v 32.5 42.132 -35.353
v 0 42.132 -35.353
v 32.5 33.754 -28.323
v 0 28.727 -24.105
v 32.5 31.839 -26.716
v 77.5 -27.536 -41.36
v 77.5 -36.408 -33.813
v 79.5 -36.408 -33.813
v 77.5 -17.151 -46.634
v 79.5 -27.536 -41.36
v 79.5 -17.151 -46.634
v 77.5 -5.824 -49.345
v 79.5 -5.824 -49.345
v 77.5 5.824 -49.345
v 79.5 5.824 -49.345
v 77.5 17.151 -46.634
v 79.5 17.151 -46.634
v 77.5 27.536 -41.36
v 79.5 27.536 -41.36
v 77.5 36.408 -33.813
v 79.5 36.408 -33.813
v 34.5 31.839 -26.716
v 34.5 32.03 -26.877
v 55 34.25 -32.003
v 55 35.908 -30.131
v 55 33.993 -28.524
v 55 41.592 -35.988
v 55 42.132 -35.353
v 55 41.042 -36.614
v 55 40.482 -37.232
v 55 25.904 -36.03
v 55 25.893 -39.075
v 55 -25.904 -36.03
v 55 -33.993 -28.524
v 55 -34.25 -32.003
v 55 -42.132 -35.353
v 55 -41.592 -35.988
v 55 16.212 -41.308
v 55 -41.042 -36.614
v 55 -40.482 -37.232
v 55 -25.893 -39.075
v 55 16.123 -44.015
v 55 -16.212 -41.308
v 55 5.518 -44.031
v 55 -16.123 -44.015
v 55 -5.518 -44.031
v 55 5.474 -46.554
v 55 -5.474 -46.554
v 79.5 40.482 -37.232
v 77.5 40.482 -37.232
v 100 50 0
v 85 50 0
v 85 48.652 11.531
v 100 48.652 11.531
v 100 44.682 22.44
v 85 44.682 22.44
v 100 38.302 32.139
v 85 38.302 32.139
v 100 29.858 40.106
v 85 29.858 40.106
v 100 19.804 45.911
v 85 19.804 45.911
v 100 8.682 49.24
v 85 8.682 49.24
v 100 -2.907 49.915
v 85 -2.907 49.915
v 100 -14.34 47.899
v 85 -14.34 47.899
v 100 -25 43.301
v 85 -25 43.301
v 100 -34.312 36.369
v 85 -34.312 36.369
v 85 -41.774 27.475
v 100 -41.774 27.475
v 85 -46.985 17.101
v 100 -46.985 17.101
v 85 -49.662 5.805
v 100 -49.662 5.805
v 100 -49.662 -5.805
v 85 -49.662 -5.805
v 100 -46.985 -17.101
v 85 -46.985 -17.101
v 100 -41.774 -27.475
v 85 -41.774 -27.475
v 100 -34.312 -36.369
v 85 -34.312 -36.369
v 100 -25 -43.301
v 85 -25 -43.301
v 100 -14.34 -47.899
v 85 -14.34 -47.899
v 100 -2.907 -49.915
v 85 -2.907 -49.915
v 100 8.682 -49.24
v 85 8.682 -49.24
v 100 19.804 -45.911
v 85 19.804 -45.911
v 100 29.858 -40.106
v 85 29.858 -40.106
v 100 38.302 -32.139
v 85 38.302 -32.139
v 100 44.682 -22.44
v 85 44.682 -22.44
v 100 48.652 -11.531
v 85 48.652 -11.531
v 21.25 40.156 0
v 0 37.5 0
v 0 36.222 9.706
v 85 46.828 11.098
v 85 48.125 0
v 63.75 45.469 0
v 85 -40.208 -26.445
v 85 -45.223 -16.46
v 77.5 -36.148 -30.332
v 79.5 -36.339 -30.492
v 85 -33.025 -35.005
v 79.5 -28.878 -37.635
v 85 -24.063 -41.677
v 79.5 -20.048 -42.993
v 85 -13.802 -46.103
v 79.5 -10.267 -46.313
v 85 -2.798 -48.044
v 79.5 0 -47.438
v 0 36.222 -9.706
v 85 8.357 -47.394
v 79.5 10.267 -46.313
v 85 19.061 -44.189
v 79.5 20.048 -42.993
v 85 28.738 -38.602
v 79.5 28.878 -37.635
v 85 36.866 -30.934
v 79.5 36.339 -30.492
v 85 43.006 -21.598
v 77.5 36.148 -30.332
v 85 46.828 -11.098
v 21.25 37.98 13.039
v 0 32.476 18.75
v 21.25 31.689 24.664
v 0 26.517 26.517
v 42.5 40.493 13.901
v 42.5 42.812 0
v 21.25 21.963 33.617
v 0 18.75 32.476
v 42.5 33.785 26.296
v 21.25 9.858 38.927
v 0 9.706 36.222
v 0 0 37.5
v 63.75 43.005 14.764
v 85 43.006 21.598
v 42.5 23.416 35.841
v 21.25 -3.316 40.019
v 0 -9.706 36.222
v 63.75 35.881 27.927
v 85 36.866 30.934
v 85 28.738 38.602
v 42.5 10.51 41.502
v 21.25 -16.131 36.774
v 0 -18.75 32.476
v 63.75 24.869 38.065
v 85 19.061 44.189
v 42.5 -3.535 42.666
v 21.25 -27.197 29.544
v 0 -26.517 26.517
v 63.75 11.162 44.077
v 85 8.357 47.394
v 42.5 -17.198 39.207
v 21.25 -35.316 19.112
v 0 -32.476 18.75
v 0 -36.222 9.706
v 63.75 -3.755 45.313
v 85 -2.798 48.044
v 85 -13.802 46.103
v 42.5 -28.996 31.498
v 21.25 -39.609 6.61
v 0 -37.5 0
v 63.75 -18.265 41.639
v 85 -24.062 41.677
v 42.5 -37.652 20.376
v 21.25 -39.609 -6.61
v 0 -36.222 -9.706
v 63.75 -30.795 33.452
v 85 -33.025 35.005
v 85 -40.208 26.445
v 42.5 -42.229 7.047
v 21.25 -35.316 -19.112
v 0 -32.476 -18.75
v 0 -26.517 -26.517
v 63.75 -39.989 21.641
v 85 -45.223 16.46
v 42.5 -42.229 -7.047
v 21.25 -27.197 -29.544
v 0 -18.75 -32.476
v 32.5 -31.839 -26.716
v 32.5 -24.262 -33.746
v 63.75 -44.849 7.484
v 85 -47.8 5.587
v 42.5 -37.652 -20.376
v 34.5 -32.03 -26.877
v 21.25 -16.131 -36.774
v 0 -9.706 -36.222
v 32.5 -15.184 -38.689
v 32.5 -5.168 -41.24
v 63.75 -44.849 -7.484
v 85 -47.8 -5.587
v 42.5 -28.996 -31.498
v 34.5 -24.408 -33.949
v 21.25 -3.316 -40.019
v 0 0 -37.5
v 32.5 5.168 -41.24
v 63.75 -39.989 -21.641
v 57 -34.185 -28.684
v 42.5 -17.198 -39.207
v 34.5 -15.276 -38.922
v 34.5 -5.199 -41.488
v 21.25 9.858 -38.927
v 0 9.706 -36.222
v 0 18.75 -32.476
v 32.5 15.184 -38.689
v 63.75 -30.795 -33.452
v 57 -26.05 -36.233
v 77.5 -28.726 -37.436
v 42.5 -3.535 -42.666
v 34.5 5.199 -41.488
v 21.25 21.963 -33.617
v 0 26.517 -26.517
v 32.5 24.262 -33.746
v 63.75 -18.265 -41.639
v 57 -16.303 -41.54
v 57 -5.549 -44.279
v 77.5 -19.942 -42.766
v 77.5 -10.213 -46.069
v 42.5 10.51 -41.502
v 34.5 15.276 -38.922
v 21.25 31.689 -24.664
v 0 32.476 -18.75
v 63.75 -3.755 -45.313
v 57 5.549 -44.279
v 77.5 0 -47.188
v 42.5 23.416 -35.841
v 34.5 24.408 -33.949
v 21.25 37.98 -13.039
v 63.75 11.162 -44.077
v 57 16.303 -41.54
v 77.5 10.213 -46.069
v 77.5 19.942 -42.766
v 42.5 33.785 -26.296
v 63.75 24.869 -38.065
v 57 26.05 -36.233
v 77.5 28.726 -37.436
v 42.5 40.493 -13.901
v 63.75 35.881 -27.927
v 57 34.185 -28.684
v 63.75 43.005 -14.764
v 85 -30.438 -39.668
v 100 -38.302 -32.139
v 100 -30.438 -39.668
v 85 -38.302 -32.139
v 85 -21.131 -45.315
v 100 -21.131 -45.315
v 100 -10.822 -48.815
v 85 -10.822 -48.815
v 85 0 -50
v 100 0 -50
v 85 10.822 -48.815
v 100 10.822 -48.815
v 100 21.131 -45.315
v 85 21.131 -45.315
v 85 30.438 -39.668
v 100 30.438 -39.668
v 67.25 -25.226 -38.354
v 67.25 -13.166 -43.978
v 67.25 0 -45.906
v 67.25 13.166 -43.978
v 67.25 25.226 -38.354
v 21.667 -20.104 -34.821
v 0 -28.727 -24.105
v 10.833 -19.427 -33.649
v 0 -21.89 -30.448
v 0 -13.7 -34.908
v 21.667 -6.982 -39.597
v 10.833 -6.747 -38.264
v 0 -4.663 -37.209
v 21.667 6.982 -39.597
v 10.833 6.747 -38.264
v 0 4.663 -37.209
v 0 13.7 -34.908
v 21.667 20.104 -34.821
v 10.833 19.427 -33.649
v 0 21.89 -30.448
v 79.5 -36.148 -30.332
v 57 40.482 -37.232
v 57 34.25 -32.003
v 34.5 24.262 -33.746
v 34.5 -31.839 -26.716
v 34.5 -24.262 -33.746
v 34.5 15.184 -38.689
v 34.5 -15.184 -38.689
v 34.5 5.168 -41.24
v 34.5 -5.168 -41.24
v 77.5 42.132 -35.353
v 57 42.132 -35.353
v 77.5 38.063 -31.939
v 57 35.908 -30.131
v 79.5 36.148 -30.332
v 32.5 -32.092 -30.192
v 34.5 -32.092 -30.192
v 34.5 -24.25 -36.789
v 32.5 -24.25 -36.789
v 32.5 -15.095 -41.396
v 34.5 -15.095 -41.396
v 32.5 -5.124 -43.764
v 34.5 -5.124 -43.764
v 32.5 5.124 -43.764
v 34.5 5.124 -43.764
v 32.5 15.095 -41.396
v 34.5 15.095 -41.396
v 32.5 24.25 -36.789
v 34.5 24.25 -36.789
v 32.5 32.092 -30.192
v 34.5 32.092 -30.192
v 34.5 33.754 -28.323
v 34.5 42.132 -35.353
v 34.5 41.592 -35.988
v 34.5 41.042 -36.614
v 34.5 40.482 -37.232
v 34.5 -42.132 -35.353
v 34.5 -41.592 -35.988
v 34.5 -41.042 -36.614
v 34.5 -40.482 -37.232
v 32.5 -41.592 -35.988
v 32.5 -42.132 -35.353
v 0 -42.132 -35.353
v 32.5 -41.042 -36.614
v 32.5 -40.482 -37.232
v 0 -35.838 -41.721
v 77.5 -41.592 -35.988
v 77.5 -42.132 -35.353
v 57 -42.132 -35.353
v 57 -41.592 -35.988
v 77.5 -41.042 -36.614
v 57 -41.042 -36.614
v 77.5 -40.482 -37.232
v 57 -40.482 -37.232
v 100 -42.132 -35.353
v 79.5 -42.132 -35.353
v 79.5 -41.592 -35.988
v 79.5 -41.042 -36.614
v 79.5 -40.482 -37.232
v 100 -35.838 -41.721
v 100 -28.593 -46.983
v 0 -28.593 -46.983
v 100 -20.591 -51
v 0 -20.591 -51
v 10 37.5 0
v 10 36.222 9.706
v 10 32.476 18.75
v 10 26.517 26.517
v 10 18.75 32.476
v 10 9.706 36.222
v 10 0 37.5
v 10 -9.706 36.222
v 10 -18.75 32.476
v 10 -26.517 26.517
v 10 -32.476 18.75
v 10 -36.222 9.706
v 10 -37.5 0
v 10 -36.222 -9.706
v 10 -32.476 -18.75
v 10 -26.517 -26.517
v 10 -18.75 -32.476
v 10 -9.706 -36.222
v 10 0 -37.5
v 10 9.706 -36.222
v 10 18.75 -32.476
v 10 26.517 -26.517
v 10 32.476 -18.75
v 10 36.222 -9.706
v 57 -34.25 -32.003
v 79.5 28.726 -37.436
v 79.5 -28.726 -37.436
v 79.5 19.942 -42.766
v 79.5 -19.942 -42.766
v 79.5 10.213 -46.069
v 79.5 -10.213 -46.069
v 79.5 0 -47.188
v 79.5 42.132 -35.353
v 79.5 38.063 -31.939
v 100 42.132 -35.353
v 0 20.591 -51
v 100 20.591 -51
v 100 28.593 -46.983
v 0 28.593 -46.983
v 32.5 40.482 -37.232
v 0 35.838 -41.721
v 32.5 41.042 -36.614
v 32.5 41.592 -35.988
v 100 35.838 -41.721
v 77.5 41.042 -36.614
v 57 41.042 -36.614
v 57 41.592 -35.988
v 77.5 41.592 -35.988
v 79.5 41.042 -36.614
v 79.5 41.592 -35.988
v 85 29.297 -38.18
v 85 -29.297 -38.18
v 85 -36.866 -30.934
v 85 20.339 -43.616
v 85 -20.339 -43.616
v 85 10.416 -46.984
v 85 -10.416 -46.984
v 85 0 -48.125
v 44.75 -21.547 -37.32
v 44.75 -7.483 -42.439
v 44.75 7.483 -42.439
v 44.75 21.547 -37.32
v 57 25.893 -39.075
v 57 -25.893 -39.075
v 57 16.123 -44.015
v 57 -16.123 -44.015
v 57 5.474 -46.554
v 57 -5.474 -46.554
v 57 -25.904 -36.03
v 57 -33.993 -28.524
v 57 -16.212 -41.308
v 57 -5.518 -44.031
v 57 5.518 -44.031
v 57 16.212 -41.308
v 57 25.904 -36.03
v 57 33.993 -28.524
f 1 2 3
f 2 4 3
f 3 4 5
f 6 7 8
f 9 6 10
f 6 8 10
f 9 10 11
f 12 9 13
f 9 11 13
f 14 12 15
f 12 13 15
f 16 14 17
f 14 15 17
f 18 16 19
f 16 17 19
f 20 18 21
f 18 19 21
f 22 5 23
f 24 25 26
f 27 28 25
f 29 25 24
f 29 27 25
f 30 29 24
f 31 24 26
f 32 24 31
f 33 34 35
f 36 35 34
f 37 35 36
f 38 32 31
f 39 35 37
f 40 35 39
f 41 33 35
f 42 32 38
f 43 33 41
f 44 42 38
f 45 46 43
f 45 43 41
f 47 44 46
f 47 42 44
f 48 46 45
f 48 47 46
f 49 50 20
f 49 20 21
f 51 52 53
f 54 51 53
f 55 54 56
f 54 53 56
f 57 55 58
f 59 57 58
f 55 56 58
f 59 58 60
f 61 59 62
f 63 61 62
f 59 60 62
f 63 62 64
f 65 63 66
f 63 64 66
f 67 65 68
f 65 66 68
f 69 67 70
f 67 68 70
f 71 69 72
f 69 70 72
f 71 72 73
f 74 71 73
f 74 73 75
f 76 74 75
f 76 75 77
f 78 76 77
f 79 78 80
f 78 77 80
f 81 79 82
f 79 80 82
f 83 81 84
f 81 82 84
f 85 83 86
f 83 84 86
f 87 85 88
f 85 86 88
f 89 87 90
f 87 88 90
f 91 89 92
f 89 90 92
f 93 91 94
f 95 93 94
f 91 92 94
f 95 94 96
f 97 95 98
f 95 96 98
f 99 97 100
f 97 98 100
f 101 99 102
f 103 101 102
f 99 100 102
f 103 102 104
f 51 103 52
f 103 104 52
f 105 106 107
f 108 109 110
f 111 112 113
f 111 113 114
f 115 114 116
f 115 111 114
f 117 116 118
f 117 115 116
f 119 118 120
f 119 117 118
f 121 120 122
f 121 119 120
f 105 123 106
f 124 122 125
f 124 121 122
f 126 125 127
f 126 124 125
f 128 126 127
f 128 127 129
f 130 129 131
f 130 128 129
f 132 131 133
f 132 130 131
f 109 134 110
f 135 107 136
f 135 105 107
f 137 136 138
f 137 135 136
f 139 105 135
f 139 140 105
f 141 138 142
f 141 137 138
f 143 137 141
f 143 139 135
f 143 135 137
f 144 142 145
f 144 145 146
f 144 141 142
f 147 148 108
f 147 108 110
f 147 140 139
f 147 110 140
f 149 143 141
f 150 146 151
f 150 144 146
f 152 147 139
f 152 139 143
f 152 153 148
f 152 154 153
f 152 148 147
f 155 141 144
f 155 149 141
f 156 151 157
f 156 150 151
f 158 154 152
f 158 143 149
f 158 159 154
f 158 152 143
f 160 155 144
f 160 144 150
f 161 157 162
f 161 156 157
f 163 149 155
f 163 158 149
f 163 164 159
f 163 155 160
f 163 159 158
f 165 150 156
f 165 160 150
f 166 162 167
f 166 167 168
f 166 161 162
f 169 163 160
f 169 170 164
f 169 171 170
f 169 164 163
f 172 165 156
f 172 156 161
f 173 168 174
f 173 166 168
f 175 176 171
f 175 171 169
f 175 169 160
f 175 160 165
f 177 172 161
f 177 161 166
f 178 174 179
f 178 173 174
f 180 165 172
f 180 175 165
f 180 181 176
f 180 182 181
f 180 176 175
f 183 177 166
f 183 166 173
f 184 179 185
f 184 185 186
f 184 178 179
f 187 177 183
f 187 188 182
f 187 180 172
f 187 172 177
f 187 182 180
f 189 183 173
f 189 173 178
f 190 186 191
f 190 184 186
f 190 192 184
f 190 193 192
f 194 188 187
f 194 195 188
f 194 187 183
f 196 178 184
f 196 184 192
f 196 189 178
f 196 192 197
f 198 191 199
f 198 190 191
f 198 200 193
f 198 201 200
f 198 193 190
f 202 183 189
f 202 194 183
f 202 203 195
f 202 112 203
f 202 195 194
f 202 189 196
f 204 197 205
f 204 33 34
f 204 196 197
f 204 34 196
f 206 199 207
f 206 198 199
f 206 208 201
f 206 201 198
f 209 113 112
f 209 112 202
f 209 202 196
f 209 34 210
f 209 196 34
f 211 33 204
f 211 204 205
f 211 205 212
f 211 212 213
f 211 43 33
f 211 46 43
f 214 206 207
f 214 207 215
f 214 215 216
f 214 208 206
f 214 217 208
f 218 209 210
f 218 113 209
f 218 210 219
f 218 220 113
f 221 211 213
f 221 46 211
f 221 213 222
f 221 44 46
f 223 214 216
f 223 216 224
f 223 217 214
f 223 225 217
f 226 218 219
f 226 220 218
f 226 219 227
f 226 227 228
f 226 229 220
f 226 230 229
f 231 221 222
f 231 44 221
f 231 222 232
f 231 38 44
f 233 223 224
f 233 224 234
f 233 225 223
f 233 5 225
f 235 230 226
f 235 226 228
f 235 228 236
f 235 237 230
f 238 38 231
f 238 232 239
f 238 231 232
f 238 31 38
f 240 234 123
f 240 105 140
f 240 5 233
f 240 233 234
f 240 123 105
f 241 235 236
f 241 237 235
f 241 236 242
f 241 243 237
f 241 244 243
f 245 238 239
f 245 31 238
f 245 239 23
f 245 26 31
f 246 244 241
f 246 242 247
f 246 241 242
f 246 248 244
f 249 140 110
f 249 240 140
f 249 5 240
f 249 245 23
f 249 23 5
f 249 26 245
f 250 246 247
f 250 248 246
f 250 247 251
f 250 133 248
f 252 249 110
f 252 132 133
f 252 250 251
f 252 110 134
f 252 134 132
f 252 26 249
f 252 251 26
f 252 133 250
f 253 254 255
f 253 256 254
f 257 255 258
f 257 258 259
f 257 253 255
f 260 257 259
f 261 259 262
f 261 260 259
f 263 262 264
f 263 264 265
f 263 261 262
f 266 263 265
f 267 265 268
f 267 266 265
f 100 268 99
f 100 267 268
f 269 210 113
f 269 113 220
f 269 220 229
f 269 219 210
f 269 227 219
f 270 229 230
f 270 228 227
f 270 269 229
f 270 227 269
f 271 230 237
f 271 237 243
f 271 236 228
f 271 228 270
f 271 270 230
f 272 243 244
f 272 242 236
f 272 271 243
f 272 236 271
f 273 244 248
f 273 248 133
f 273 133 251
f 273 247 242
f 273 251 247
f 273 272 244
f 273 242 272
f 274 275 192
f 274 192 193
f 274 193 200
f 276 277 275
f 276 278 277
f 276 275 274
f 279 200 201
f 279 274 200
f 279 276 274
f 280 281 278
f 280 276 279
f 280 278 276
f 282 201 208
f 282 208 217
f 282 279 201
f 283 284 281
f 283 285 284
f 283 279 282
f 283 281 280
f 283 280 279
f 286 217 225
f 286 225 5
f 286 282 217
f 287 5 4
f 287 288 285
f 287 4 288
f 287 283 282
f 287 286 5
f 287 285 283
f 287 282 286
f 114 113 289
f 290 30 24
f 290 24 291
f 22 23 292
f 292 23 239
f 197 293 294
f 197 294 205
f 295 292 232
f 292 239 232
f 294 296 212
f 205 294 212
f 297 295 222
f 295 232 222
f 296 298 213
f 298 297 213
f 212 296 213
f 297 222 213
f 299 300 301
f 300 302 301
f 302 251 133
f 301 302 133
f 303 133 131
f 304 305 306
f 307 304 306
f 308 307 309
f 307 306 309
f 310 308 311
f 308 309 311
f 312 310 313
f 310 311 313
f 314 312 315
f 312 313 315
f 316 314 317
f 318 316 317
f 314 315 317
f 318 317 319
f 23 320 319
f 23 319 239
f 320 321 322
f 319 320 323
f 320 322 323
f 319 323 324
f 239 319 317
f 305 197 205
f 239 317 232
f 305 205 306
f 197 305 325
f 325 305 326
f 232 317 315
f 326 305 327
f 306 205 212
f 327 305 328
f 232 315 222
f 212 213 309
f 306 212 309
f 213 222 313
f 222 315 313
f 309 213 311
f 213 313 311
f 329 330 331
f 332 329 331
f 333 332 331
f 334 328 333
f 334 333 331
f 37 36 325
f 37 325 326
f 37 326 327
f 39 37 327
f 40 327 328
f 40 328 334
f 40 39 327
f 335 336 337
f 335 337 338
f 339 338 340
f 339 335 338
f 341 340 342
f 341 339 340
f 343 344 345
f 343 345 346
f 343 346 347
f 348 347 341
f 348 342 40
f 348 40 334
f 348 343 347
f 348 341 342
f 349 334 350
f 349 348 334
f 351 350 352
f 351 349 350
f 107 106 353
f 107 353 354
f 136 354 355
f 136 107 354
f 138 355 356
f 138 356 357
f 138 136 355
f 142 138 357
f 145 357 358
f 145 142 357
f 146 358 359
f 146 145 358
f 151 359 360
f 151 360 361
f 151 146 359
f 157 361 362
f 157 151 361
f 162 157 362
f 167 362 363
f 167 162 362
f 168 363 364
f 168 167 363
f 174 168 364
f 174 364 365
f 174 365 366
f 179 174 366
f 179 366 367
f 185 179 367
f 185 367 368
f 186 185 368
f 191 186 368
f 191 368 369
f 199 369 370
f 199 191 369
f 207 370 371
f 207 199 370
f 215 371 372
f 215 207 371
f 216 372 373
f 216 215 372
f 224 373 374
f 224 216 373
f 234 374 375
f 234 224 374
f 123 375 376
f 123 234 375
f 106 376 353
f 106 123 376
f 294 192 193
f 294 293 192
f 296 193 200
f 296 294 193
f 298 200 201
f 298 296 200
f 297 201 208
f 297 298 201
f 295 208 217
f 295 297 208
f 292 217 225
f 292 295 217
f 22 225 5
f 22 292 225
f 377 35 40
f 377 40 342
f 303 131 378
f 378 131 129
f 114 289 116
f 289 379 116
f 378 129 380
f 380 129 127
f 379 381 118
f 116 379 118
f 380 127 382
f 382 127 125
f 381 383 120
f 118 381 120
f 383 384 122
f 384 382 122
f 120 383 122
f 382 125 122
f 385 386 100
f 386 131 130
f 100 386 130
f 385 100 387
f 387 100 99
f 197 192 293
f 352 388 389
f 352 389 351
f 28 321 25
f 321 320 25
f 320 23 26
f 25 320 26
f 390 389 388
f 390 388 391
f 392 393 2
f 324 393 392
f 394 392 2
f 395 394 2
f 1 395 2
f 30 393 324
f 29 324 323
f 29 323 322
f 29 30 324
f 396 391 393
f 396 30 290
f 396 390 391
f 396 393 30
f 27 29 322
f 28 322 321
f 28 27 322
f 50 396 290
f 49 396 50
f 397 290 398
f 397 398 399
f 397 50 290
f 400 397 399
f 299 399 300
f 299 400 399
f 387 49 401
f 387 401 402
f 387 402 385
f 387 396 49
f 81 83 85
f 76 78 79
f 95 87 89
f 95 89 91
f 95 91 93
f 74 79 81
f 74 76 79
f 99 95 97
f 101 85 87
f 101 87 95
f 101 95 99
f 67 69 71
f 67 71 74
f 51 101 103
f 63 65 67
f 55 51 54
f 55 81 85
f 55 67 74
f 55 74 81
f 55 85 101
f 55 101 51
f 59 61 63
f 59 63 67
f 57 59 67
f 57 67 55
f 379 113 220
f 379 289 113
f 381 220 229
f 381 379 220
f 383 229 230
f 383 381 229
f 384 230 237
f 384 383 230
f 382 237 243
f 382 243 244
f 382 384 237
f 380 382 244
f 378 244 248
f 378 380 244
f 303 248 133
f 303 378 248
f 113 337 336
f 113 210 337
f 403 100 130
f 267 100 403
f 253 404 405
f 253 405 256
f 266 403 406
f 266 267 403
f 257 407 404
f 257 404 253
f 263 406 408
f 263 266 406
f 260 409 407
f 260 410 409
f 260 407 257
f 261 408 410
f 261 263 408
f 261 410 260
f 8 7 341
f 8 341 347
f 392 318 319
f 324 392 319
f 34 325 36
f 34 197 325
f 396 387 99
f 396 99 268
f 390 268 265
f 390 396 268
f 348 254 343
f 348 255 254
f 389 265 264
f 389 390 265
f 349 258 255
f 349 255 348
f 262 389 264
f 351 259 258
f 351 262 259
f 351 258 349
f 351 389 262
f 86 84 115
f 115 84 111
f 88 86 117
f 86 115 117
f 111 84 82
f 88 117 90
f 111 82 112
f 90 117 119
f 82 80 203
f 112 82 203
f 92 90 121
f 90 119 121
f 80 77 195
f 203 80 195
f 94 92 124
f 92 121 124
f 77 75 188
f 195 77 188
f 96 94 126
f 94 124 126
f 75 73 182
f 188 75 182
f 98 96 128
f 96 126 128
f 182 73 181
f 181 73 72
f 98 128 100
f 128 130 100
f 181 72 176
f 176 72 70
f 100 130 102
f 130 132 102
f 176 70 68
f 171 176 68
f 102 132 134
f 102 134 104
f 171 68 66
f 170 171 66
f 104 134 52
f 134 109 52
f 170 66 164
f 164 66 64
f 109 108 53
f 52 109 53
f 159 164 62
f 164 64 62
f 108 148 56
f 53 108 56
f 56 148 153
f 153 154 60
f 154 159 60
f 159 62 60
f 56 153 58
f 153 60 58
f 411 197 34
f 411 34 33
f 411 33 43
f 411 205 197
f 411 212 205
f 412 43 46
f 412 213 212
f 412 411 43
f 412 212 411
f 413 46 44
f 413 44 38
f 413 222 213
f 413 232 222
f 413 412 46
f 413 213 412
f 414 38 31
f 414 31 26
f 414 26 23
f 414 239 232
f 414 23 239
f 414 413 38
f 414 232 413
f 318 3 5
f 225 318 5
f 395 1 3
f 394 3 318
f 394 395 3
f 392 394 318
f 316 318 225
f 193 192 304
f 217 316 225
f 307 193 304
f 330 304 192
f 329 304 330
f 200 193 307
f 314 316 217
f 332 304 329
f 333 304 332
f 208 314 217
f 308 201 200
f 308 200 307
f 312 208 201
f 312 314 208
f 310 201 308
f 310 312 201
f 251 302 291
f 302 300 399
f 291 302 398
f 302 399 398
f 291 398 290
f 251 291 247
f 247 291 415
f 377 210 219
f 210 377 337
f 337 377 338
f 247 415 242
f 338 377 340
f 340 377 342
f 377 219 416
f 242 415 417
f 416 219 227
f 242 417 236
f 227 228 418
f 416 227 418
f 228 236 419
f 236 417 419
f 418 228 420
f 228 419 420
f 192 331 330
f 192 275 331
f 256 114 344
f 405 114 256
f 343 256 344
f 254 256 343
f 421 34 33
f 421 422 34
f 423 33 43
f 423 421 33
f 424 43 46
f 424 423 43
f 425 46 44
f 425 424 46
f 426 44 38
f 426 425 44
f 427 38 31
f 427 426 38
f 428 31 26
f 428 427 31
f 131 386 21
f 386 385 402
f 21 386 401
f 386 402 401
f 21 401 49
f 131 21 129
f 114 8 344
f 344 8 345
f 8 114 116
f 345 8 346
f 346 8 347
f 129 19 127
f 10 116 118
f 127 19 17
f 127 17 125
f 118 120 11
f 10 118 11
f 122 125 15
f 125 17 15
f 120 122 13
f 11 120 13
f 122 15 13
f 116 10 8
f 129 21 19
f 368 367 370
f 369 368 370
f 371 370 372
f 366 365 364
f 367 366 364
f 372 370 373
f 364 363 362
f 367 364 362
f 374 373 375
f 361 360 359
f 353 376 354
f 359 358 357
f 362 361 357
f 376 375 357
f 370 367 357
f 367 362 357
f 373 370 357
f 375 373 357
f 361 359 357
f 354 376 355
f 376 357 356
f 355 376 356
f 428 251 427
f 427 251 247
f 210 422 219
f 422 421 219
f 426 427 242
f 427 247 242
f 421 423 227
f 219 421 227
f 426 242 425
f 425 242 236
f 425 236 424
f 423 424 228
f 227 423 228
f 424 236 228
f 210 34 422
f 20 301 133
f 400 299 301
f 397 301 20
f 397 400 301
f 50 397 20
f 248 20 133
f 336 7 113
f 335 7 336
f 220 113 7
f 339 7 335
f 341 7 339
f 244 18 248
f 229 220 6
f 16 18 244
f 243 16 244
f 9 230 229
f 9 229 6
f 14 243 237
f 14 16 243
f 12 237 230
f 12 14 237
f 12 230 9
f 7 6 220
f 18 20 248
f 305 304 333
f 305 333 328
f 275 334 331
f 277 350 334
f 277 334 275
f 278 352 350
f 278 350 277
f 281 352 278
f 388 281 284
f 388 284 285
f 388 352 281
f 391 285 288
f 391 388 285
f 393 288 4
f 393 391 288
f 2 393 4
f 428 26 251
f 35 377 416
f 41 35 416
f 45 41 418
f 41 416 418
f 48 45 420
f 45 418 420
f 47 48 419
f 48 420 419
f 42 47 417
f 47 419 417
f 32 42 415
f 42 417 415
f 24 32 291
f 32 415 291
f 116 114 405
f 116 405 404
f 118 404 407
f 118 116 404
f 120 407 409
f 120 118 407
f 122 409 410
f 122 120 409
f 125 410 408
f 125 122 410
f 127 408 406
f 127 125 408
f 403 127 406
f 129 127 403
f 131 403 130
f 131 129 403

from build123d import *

# Parameters (mm, degrees)
F0_R          = 37.5
F2_R          = 50
F4_R          = 50
F6_DEPTH      = 15
F7_DEPTH      = 10
F9_ANGLE_BACK = 50
F9_ANGLE      = 100
F10_W         = 2
F10_H         = 2.5
F11_ANGLE     = 100
F13_DEPTH     = 100
F14_W         = 2
F14_H         = 10.9375
F14_H_2       = 8.125
F14_H_3       = 5.3125
F15_DEPTH     = 2.5
F16_W         = 2
F16_H         = 5.3125
F16_H_2       = 8.125
F16_H_3       = 10.9375
F17_DEPTH     = 2.5


# Not quite as in the source:
# - a feature names something its author has since deleted; it is built from what else it names


with BuildPart() as f5:
    # F0 (on Right) → F5 section 0
    with BuildSketch(Plane.YZ):
        Circle(F0_R)
    # F2 (on offset) → F5 section 1
    with BuildSketch(Plane.YZ.offset(100)):
        Circle(F2_R)
    loft()

    # F4 (on offset) → F6 (join, through all)
    with BuildSketch(Plane.YZ.offset(85)):
        Circle(F4_R)
    extrude(amount=F6_DEPTH)

    # F7 (cut): a face of the model
    f7_faces = [f5.faces().sort_by_distance(p)[0] for p in [
        (0, 0, 0),
    ]]
    extrude(f7_faces, amount=-F7_DEPTH, mode=Mode.SUBTRACT)


with BuildPart() as f9:
    # F8 (on Front) → F9 (revolve)
    with BuildSketch(Plane.XZ, mode=Mode.PRIVATE) as f9_sk:
        Polygon((85, -50), (85, -48.125), (0, -37.5), (0, -55), (100, -55), (100, -50), align=None)
    revolve(f9_sk.sketch.rotate(Axis((53.7593327463, 0, 0), (1, 0, 0)), -F9_ANGLE_BACK), axis=Axis((53.7593327463, 0, 0), (1, 0, 0)), revolution_arc=F9_ANGLE)


with BuildPart() as f11_tool:
    # F10 (on face) → F11 (revolve)
    with BuildSketch(Plane(origin=(0, 0, 0), x_dir=(1, 0, 0), z_dir=(0, -0.6427876097, 0.7660444431))):
        with Locations((33.5, -42.8125)):
            Rectangle(F10_W, F10_H)
        with Locations((56, -45.625)):
            Rectangle(F10_W, F10_H)
        with Locations((78.5, -48.4375)):
            Rectangle(F10_W, F10_H)
    revolve(axis=Axis((53.7593327463, 0, 0), (1, 0, 0)), revolution_arc=F11_ANGLE)


with BuildPart() as f5_1:
    add(f5.part)

    # F11: cut by f11_tool
    add(f11_tool.part, mode=Mode.SUBTRACT)


with BuildPart() as f9_1:
    add(f9.part)

    # F11: cut by f11_tool
    add(f11_tool.part, mode=Mode.SUBTRACT)

    # F12 (on face) → F13 (cut, through all)
    with BuildSketch(Plane.YZ.offset(100)):
        with BuildLine():
            Line((-20.591260282, -51), (-50.5514740944, -51))
            Line((-50.5514740944, -51), (-50.5514740944, -60.0057376325))
            Line((-50.5514740944, -60.0057376325), (49.9166063964, -60.0057376325))
            Line((49.9166063964, -60.0057376325), (49.9166063964, -51))
            Line((49.9166063964, -51), (20.591260282, -51))
            ThreePointArc((20.591260282, -51), (0, -55), (-20.591260282, -51))
        make_face()
        with BuildLine():
            Line((20.591260282, -51), (-20.591260282, -51))
            ThreePointArc((-20.591260282, -51), (0, -55), (20.591260282, -51))
        make_face()
    extrude(amount=-F13_DEPTH, mode=Mode.SUBTRACT)

    # F14 (on face) → F15 (cut)
    with BuildSketch(Plane(origin=(0, 0, 0), x_dir=(1, 0, 0), z_dir=(0, -0.6427876097, 0.7660444431))):
        with Locations((33.5, -49.53125)):
            Rectangle(F14_W, F14_H)
        Polygon((34.5, -41.5625), (32.5, -41.5625), (32.5, -44.0625), (34.5, -44.0625), (34.5, -41.8125), align=None)
        Polygon((57, -44.375), (55, -44.375), (55, -46.875), (57, -46.875), (57, -44.625), align=None)
        with Locations((56, -50.9375)):
            Rectangle(F14_W, F14_H_2)
        Polygon((79.5, -47.1875), (77.5, -47.1875), (77.5, -49.6875), (79.5, -49.6875), (79.5, -47.4375), align=None)
        with Locations((78.5, -52.34375)):
            Rectangle(F14_W, F14_H_3)
    extrude(amount=-F15_DEPTH, mode=Mode.SUBTRACT)

    # F16 (on face) → F17 (cut)
    with BuildSketch(Plane(origin=(0, 0, 0), x_dir=(1, 0, 0), z_dir=(0, 0.6427876097, 0.7660444431))):
        with Locations((78.5, 52.34375)):
            Rectangle(F16_W, F16_H)
        Polygon((77.5, 49.6875), (77.5, 47.1875), (79.5, 47.1875), (79.5, 47.4375), (79.5, 49.6875), align=None)
        Polygon((55, 46.875), (55, 44.375), (57, 44.375), (57, 44.625), (57, 46.875), align=None)
        with Locations((56, 50.9375)):
            Rectangle(F16_W, F16_H_2)
        with Locations((33.5, 49.53125)):
            Rectangle(F16_W, F16_H_3)
        Polygon((32.5, 44.0625), (32.5, 41.5625), (34.5, 41.5625), (34.5, 41.8125), (34.5, 44.0625), align=None)
    extrude(amount=-F17_DEPTH, mode=Mode.SUBTRACT)


solid = Compound([f5_1.part, f9_1.part])
